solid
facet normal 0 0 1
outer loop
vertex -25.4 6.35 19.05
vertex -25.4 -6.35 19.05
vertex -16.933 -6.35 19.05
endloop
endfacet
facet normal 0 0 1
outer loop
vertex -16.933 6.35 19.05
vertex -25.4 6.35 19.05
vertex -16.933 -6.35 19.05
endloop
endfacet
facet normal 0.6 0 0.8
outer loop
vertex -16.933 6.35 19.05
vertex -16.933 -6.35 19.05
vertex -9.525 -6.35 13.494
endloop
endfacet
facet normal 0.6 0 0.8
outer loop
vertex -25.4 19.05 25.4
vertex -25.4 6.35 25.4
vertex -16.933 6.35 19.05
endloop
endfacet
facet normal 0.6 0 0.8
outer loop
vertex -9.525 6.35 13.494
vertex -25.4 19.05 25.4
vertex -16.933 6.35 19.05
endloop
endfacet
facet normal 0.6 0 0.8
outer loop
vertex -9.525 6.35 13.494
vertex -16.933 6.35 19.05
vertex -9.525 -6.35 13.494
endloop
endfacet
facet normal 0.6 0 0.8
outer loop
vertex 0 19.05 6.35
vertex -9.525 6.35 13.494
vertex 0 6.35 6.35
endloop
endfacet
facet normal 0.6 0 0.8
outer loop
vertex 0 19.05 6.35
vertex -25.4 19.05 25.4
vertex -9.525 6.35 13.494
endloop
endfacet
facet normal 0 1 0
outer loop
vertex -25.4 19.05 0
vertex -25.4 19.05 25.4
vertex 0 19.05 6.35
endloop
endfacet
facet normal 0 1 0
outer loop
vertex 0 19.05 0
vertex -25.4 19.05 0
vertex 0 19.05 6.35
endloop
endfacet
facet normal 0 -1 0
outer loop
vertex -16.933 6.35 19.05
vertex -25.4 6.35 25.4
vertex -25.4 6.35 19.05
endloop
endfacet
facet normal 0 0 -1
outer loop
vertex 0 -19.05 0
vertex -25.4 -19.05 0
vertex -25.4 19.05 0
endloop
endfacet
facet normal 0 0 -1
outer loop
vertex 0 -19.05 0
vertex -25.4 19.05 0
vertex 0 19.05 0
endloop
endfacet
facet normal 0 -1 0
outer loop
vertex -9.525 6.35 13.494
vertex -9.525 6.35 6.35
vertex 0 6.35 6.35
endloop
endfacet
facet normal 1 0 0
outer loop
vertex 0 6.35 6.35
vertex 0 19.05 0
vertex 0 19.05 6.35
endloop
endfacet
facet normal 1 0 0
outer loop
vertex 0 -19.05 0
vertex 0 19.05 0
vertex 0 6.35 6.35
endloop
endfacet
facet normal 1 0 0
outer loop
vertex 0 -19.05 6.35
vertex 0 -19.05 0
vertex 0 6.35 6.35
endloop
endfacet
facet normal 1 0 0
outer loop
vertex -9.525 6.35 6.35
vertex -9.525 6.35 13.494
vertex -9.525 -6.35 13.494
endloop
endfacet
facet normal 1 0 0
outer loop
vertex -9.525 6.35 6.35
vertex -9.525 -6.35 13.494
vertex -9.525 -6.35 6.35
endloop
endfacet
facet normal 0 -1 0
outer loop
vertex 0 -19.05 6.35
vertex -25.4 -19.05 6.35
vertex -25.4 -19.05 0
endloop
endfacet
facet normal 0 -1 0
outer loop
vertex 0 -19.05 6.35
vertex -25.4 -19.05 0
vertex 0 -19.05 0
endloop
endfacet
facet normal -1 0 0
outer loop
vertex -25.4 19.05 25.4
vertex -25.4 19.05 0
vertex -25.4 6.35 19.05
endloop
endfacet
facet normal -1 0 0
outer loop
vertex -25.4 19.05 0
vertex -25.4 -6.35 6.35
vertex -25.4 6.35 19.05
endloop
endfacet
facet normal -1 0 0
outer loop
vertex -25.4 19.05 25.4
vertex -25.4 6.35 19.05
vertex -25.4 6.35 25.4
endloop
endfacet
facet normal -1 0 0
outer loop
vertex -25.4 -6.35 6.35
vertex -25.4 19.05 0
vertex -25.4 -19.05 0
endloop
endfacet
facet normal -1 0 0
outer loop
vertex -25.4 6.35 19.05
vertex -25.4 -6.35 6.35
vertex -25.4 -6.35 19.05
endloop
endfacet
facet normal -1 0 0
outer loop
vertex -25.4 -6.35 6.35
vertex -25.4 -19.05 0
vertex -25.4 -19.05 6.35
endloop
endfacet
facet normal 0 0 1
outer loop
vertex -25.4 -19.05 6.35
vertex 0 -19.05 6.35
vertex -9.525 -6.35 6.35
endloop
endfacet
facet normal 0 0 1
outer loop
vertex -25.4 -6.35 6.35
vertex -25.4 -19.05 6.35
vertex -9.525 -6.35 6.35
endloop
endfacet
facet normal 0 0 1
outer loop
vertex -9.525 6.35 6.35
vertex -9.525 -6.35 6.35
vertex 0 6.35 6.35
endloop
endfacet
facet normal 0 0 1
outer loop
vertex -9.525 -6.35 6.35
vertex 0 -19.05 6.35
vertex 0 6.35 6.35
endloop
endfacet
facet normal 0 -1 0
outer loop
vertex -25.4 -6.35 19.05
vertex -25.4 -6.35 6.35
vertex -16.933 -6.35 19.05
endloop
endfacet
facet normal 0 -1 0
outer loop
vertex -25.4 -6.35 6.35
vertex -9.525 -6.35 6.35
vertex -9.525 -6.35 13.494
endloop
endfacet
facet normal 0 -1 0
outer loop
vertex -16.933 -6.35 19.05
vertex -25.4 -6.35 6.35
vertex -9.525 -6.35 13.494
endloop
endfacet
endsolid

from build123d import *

# Parameters (mm, degrees)
F0_W           = 25.4
F0_H           = 25.4
F1_DEPTH       = 19.05
F3_DEPTH       = 19.051
F3_DEPTH_BACK  = 25.4
F5_DEPTH       = 25.4
F5_DEPTH_BACK  = 6.35
F6_W           = 12.7
F6_H           = 12.7
F7_DEPTH       = 25.401
F8_W           = 6.35
F8_H           = 6.35
F9_DEPTH       = 4.7625
F11_DEPTH      = 25.4
F11_DEPTH_BACK = 6.35


with BuildPart() as f1:
    # F0 (on Front) → F1 (new body, symmetric)
    with BuildSketch(Plane.XZ):
        with Locations((-12.7, 12.7)):
            Rectangle(F0_W, F0_H)
    extrude(amount=F1_DEPTH, both=True)

    # F2 (on Front) → F3 (cut, two sides)
    with BuildSketch(Plane.XZ) as f3_sk:
        Polygon((-25.4, 25.4), (0, 6.35), (0, 25.4), align=None)
    extrude(amount=-F3_DEPTH, mode=Mode.SUBTRACT)
    extrude(f3_sk.sketch, amount=F3_DEPTH_BACK, mode=Mode.SUBTRACT)

    # F4 (on Front) → F5 (cut, two sides)
    with BuildSketch(Plane.XZ) as f5_sk:
        Polygon((-25.4, 25.4), (-25.4, 19.05), (-16.9333333333, 19.05), align=None)
    extrude(amount=F5_DEPTH, mode=Mode.SUBTRACT)
    extrude(f5_sk.sketch, amount=-F5_DEPTH_BACK, mode=Mode.SUBTRACT)

    # F6 (on Right) → F7 (cut, through all)
    with BuildSketch(Plane.YZ):
        with Locations((-12.7, 12.7)):
            Rectangle(F6_W, F6_H)
    extrude(amount=-F7_DEPTH, mode=Mode.SUBTRACT)

    # F8 (on Right) → F9 (cut, symmetric)
    with BuildSketch(Plane.YZ):
        with Locations((3.175, 9.525)):
            Rectangle(F8_W, F8_H)
    extrude(amount=F9_DEPTH, both=True, mode=Mode.SUBTRACT)

    # F10 (on Front) → F11 (cut, two sides)
    with BuildSketch(Plane.XZ) as f11_sk:
        Polygon((0, 6.35), (-9.525, 13.49375), (-9.525, 6.35), align=None)
    extrude(amount=F11_DEPTH, mode=Mode.SUBTRACT)
    extrude(f11_sk.sketch, amount=-F11_DEPTH_BACK, mode=Mode.SUBTRACT)


solid = f1.part
